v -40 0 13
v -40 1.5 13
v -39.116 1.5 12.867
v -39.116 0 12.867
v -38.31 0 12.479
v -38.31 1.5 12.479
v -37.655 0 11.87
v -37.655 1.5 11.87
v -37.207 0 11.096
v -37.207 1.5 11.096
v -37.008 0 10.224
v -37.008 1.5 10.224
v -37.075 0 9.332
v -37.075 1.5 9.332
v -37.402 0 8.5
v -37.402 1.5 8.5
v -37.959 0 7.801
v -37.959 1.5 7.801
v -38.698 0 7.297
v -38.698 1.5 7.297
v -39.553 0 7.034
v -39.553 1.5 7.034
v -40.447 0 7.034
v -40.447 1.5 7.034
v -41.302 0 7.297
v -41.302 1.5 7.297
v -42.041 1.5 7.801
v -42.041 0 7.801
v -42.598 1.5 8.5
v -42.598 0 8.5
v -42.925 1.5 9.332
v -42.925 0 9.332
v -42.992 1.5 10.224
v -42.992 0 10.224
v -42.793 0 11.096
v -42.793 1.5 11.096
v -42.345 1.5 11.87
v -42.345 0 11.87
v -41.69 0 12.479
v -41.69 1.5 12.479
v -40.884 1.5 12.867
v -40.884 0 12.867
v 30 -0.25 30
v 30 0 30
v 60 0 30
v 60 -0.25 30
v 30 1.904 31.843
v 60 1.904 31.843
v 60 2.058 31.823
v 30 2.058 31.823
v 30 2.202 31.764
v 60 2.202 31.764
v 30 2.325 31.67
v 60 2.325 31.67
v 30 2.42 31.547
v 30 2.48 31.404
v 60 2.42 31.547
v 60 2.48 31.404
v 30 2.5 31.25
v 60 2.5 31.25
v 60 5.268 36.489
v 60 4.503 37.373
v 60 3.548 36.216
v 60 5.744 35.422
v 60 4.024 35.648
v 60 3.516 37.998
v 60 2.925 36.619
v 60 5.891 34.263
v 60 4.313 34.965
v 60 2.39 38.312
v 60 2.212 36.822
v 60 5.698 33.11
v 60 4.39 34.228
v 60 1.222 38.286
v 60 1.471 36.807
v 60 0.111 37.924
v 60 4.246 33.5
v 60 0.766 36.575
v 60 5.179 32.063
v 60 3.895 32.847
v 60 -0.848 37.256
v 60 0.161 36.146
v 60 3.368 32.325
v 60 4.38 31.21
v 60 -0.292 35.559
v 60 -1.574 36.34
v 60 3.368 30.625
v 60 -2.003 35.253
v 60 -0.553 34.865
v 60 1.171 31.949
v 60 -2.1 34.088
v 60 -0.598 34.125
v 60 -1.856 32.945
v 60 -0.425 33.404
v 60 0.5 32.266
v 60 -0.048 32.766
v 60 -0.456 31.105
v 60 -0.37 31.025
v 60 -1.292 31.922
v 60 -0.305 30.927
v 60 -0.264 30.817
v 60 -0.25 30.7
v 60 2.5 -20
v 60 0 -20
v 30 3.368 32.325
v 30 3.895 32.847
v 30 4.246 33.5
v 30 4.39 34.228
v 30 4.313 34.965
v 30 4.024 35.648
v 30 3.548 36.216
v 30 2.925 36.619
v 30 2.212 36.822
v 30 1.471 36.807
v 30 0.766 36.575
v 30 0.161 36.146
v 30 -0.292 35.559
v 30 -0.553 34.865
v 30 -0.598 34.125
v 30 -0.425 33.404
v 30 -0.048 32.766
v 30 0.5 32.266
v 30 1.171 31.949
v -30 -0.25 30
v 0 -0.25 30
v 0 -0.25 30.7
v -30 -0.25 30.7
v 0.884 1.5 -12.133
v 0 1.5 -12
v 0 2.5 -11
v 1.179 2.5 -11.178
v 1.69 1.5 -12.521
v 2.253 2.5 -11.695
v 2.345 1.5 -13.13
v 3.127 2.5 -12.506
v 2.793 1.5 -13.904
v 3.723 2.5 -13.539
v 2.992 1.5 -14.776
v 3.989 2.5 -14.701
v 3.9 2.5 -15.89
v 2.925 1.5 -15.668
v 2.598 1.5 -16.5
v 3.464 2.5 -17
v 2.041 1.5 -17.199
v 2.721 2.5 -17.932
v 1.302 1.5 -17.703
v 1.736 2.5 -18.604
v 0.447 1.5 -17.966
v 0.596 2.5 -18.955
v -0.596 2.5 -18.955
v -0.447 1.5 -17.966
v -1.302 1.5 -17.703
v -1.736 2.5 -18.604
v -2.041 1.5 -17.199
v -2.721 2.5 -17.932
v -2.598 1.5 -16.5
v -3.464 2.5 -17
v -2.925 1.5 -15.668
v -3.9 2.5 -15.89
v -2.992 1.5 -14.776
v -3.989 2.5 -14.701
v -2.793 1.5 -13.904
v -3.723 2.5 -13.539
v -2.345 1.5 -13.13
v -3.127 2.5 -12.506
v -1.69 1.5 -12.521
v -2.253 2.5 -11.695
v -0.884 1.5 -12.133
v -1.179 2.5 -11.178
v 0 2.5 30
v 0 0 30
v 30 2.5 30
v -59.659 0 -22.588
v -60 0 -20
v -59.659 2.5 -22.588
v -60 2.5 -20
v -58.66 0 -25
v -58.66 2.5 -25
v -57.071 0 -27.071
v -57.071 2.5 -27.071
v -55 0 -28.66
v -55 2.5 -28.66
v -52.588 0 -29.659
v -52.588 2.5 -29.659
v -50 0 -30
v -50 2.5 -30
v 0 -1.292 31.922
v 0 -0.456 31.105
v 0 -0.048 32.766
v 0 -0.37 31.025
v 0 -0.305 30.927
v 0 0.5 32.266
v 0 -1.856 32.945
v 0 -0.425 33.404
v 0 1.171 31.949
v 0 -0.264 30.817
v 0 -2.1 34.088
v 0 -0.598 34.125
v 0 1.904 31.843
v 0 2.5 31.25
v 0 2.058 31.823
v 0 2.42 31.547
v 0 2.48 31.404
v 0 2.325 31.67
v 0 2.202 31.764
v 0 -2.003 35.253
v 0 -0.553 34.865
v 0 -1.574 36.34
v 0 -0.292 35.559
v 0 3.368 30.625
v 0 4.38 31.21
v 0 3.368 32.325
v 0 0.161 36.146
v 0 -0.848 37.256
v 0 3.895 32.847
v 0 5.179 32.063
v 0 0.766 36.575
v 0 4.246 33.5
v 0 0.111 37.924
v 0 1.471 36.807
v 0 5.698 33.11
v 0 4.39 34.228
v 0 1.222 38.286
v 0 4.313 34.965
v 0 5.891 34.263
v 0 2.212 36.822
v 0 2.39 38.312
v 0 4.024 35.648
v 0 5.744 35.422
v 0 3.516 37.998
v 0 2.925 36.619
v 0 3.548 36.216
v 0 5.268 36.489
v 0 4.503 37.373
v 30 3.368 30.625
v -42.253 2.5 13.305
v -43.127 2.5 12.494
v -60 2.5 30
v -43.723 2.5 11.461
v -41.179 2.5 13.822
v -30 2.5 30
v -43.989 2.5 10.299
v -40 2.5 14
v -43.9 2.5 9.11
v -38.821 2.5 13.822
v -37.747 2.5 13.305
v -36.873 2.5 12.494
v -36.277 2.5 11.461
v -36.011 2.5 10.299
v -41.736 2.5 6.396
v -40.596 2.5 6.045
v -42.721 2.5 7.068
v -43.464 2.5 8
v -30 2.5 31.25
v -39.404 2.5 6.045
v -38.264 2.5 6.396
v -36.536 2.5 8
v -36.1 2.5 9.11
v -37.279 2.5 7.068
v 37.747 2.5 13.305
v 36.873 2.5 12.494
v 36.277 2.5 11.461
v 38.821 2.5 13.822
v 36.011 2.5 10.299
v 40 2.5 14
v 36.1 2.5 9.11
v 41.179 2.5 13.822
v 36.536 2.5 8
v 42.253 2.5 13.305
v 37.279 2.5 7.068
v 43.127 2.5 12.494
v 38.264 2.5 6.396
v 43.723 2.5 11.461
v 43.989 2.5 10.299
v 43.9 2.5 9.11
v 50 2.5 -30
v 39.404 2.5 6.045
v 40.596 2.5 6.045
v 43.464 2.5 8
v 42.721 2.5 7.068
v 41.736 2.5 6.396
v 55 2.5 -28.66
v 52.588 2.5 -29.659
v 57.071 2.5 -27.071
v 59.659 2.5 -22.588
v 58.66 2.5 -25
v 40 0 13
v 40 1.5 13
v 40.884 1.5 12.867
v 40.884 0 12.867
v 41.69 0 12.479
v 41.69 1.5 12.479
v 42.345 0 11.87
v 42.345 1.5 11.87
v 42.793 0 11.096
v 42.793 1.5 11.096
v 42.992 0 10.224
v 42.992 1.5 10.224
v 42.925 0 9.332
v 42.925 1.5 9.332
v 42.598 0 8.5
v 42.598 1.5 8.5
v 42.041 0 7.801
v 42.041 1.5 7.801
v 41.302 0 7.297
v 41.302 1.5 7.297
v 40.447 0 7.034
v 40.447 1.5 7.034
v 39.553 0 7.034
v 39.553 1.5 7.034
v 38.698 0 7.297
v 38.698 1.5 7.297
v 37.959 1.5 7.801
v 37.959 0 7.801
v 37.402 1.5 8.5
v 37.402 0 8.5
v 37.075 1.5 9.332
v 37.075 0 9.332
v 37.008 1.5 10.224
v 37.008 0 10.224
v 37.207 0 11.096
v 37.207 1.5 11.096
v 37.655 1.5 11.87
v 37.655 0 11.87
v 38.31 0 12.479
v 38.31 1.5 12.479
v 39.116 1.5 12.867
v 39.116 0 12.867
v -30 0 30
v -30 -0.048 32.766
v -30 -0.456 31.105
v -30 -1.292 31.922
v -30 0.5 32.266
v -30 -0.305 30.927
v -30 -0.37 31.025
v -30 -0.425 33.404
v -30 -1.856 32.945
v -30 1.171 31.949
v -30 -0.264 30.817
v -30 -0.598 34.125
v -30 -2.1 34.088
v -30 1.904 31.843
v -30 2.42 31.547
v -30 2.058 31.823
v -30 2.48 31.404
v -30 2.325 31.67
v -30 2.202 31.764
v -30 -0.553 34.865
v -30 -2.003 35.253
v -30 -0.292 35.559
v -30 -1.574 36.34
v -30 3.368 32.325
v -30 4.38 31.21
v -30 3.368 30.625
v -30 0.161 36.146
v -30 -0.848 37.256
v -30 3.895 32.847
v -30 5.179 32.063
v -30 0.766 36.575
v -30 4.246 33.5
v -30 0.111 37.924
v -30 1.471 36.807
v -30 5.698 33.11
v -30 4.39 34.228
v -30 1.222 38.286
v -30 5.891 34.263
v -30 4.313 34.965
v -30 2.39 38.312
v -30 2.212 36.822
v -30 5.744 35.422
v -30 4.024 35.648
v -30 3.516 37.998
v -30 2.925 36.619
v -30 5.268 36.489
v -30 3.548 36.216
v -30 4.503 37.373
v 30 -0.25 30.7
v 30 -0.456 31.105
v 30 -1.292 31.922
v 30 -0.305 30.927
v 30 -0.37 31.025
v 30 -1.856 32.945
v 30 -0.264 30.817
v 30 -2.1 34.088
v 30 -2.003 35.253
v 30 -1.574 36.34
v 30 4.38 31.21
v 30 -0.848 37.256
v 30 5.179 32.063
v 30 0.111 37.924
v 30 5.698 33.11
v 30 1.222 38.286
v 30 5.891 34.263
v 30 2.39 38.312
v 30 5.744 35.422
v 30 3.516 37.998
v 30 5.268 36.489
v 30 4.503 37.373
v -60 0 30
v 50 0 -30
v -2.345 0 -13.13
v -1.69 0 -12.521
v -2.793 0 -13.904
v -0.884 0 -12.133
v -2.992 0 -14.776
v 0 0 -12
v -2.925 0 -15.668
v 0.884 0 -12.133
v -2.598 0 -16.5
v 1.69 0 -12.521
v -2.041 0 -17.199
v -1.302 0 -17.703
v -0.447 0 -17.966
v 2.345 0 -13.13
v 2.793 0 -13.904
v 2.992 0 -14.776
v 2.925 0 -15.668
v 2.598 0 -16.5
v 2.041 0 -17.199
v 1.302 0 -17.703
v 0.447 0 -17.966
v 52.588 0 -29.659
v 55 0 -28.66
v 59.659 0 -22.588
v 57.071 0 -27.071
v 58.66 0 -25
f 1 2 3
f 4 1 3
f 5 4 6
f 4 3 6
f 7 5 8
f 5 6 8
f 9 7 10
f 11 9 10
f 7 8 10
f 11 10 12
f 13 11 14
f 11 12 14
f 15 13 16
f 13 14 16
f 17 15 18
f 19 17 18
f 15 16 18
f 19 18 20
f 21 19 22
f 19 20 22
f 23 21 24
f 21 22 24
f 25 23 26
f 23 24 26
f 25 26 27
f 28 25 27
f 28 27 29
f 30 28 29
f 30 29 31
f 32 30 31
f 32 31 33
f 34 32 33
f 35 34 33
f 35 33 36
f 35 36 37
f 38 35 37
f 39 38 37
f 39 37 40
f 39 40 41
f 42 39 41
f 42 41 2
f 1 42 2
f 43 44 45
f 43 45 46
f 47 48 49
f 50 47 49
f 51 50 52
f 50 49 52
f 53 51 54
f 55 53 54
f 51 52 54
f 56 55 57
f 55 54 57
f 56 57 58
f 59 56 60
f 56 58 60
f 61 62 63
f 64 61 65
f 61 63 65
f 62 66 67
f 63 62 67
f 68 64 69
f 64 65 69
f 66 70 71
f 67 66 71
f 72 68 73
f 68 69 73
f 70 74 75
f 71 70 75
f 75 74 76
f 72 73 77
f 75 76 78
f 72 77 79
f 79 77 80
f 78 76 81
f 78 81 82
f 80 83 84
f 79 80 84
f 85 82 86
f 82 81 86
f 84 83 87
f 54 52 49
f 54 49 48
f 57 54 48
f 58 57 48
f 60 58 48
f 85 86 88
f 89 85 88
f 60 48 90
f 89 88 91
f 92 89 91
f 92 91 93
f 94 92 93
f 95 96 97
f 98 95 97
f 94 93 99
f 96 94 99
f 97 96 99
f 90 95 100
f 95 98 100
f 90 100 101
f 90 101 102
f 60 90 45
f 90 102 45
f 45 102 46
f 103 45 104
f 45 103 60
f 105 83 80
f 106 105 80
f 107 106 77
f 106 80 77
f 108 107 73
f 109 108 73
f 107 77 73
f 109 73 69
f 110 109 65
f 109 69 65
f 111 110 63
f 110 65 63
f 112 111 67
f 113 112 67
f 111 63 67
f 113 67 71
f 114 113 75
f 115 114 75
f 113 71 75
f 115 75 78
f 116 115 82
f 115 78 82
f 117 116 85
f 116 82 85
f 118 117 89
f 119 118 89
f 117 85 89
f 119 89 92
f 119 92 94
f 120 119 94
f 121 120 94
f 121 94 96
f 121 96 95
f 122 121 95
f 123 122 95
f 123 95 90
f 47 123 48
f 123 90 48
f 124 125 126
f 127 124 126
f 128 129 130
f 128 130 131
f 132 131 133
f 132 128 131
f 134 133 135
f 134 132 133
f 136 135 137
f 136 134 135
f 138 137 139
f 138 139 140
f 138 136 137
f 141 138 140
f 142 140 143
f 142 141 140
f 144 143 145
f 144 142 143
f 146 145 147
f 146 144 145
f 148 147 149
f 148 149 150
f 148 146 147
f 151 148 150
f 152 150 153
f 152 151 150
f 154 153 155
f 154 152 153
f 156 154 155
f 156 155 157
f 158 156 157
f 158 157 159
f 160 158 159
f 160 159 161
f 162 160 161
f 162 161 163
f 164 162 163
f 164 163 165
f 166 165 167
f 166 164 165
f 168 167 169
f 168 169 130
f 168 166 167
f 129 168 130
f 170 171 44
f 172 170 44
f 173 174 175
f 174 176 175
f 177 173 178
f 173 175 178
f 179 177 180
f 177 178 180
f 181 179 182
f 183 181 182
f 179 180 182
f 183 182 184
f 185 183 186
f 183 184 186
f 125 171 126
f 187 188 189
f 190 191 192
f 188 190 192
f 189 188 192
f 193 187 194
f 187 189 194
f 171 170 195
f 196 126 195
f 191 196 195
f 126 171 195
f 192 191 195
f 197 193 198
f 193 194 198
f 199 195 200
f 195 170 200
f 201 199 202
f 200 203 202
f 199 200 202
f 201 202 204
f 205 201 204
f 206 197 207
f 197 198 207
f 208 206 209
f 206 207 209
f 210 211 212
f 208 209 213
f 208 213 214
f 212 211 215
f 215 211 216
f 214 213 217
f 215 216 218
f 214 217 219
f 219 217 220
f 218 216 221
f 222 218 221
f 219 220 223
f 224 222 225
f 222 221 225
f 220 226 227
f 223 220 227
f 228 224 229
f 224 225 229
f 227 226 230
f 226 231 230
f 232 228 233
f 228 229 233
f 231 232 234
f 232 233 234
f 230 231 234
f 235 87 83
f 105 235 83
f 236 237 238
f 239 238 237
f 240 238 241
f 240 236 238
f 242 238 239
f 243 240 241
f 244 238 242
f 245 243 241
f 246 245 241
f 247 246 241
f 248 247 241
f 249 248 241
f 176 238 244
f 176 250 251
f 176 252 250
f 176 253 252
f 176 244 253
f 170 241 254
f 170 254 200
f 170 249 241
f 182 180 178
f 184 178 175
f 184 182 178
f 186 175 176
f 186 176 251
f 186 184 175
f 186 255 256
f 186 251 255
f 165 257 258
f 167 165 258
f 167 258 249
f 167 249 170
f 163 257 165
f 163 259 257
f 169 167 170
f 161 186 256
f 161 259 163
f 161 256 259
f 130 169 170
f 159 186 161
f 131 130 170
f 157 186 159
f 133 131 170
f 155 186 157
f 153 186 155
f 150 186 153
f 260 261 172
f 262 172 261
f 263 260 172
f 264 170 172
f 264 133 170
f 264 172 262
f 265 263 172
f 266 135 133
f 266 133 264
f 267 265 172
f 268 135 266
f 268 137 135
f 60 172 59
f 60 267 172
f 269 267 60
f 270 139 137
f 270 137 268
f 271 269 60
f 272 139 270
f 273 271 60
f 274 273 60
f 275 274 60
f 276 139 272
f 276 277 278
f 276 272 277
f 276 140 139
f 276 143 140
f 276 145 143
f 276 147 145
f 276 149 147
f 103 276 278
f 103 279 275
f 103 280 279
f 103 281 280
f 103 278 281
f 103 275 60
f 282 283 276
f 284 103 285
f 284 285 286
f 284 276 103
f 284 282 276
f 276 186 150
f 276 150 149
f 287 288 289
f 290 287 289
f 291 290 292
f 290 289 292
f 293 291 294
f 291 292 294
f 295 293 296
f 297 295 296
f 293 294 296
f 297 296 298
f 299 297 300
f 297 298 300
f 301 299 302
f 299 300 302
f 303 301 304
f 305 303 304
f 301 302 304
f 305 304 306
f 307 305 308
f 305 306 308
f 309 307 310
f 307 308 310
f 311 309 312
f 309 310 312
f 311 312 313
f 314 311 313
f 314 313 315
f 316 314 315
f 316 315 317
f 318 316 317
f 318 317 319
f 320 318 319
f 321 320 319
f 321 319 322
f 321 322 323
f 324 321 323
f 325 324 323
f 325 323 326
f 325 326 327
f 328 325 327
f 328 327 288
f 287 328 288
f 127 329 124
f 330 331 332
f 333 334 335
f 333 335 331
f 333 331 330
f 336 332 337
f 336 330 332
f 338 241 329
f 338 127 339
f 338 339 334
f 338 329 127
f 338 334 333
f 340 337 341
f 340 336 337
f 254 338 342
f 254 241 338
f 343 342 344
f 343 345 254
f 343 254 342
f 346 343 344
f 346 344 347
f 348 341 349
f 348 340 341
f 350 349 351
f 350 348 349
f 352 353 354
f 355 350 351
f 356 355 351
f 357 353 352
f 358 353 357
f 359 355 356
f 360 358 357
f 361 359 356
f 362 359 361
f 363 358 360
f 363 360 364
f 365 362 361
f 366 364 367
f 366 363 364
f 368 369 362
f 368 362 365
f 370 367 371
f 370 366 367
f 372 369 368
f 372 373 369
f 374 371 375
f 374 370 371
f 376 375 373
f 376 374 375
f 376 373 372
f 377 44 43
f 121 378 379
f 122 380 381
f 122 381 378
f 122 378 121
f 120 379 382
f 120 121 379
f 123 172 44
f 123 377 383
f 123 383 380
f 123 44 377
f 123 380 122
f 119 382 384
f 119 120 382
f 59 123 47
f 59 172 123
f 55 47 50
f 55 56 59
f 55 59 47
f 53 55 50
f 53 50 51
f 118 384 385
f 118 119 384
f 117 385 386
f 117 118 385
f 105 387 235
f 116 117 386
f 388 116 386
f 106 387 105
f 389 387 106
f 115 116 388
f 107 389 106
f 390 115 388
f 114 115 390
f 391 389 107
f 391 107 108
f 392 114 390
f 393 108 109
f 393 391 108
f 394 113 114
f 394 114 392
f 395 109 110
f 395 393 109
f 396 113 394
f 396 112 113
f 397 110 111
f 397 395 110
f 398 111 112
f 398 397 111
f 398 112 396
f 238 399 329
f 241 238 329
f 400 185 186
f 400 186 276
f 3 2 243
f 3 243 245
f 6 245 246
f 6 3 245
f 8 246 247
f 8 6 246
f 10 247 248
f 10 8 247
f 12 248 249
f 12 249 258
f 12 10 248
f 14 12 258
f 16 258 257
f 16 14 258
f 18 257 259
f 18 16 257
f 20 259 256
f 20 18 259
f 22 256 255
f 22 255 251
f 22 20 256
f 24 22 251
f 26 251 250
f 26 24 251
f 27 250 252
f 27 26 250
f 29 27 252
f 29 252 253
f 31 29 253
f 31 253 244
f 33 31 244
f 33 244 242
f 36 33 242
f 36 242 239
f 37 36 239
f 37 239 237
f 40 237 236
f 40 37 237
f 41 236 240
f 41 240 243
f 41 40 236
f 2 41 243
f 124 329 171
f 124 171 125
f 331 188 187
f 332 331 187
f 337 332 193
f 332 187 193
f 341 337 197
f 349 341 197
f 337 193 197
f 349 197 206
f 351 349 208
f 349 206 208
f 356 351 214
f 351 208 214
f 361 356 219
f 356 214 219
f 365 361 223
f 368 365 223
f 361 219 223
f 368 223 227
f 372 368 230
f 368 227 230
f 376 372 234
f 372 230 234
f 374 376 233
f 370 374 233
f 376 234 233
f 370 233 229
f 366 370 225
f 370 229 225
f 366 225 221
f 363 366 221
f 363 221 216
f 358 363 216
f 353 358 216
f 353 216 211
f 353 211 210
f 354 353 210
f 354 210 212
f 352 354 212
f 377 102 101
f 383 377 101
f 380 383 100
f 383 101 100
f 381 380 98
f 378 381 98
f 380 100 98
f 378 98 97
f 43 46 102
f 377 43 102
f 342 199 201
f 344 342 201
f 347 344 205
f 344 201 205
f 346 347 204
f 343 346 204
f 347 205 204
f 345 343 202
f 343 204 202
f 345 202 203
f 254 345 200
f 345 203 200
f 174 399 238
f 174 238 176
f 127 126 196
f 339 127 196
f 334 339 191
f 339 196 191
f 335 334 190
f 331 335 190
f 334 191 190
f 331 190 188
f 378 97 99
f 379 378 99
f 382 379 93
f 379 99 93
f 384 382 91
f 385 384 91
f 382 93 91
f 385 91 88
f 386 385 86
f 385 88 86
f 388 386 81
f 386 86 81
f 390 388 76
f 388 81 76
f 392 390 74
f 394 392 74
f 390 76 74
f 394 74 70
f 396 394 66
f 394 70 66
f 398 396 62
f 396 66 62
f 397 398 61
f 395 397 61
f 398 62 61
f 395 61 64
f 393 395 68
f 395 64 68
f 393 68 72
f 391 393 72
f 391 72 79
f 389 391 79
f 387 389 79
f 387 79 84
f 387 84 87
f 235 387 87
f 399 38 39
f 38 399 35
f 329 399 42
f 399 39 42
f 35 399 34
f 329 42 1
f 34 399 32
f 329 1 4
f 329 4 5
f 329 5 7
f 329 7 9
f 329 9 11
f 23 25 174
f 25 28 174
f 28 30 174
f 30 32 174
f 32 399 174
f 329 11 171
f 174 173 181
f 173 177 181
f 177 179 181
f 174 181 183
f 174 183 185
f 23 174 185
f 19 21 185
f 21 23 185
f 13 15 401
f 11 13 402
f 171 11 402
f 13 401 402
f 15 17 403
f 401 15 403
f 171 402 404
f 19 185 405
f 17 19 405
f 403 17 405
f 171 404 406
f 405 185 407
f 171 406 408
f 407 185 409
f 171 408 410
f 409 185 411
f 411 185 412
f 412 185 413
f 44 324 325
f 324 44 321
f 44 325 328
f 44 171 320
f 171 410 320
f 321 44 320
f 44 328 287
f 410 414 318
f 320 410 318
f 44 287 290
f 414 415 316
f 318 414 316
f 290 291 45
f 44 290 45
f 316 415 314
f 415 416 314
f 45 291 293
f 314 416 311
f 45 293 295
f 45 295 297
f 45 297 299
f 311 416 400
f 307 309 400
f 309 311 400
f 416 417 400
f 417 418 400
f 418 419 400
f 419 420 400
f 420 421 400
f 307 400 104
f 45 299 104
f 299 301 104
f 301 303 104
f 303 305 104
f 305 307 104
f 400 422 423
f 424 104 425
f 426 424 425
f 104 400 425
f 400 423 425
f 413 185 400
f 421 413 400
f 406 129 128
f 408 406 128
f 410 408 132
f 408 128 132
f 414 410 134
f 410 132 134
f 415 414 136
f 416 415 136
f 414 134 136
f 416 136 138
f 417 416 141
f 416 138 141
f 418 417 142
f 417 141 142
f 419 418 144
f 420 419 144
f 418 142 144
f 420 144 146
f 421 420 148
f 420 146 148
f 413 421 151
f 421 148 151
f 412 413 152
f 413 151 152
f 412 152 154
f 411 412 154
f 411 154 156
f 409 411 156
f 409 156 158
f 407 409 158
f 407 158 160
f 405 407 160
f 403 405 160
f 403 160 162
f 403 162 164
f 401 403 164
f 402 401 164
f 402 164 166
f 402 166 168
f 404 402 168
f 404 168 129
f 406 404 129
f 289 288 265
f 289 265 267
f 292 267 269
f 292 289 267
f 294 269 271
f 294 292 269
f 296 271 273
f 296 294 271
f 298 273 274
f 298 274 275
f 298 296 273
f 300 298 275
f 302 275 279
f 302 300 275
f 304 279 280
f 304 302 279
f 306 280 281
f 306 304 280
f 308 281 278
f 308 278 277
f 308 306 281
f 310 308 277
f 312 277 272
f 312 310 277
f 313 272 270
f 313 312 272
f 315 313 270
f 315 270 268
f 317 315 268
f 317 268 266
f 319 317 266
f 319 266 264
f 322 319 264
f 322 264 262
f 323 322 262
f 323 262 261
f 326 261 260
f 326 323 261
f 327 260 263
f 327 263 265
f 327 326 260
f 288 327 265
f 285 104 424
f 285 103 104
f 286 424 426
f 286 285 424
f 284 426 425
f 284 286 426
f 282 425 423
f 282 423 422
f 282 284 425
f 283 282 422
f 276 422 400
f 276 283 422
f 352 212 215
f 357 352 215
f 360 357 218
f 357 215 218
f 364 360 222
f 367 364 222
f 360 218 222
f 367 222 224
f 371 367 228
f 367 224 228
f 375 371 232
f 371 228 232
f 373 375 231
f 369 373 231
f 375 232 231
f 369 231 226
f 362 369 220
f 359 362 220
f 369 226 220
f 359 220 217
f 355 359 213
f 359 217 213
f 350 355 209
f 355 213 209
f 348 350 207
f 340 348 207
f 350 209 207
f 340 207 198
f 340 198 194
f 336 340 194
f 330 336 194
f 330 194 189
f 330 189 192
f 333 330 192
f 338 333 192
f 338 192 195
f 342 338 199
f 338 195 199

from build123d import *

# Parameters (mm, degrees)
SKETCH1_W           = 120
SKETCH1_H           = 60
BOSS_EXTRUDE1_DEPTH = 2.5
FILLET1_R           = 10
BOSS_EXTRUDE2_DEPTH = 30
LPATTERN1_COUNT     = 2
LPATTERN1_PITCH     = 60
SKETCH3_R           = 3
CUT_EXTRUDE1_DEPTH  = 72.3539808
CHAMFER1_SIZE       = 1


with BuildPart() as part:
    # Sketch1 → Boss-Extrude1 (new body)
    with BuildSketch(Plane(origin=(0, 0, 0), x_dir=(1, 0, 0), z_dir=(0, 1, 0))):
        Rectangle(SKETCH1_W, SKETCH1_H)
    extrude(amount=BOSS_EXTRUDE1_DEPTH)

    # Fillet1
    fillet1_edges = [part.edges().sort_by_distance(p)[0] for p in [
        (-60, 1.25, -30),
        (60, 1.25, -30),
    ]]
    fillet(fillet1_edges, radius=FILLET1_R)

    # Sketch3 → Cut-Extrude1 (cut, through all)
    with BuildSketch(Plane(origin=(0, 2.5, 0), x_dir=(1, 0, 0), z_dir=(0, 1, 0))):
        with Locations(Location((40, -10, 0), (0, 0, 270))):
            Circle(SKETCH3_R)
        with Locations(Location((0, 15, 0), (0, 0, 270))):
            Circle(SKETCH3_R)
        with Locations(Location((-40, -10, 0), (0, 0, 270))):
            Circle(SKETCH3_R)
    extrude(amount=-CUT_EXTRUDE1_DEPTH, mode=Mode.SUBTRACT)

    # Chamfer1
    chamfer1_edges = [part.edges().sort_by_distance(p)[0] for p in [
        (40, 2.5, 7),
        (0, 2.5, -18),
        (-40, 2.5, 7),
    ]]
    chamfer(chamfer1_edges, length=CHAMFER1_SIZE)


with BuildPart() as body_2:
    # Sketch2 → Boss-Extrude2 (new body)
    with BuildSketch(Plane(origin=(60, 0, 0), x_dir=(0, 0, -1), z_dir=(1, 0, 0))):
        with BuildLine():
            Line((-30, 2.5), (-30, -0.25))
            Line((-30, -0.25), (-30.7, -0.25))
            ThreePointArc((-30.7, -0.25), (-30.927169701, -0.304585668), (-31.104738562, -0.456424292))
            ThreePointArc((-31.104738562, -0.456424292), (-38.311548677, 2.389996547), (-30.625, 3.368358986))
            Line((-30.625, 3.368358986), (-32.325, 3.368358986))
            ThreePointArc((-32.325, 3.368358986), (-36.717094098, 1.109876278), (-31.842676994, 1.904415516))
            ThreePointArc((-31.842676994, 1.904415516), (-31.670115132, 2.325380148), (-31.25, 2.5))
            Line((-31.25, 2.5), (-30, 2.5))
        make_face()
    extrude(amount=-BOSS_EXTRUDE2_DEPTH)


with BuildPart() as lpattern1_1:
    # LPattern1: pattern copy
    add(body_2.part.moved(Location(Vector(-1, 0, 0) * (1 * LPATTERN1_PITCH))))

    # Combine1: union body 2, part
    add(body_2.part)
    add(part.part)


solid = lpattern1_1.part
